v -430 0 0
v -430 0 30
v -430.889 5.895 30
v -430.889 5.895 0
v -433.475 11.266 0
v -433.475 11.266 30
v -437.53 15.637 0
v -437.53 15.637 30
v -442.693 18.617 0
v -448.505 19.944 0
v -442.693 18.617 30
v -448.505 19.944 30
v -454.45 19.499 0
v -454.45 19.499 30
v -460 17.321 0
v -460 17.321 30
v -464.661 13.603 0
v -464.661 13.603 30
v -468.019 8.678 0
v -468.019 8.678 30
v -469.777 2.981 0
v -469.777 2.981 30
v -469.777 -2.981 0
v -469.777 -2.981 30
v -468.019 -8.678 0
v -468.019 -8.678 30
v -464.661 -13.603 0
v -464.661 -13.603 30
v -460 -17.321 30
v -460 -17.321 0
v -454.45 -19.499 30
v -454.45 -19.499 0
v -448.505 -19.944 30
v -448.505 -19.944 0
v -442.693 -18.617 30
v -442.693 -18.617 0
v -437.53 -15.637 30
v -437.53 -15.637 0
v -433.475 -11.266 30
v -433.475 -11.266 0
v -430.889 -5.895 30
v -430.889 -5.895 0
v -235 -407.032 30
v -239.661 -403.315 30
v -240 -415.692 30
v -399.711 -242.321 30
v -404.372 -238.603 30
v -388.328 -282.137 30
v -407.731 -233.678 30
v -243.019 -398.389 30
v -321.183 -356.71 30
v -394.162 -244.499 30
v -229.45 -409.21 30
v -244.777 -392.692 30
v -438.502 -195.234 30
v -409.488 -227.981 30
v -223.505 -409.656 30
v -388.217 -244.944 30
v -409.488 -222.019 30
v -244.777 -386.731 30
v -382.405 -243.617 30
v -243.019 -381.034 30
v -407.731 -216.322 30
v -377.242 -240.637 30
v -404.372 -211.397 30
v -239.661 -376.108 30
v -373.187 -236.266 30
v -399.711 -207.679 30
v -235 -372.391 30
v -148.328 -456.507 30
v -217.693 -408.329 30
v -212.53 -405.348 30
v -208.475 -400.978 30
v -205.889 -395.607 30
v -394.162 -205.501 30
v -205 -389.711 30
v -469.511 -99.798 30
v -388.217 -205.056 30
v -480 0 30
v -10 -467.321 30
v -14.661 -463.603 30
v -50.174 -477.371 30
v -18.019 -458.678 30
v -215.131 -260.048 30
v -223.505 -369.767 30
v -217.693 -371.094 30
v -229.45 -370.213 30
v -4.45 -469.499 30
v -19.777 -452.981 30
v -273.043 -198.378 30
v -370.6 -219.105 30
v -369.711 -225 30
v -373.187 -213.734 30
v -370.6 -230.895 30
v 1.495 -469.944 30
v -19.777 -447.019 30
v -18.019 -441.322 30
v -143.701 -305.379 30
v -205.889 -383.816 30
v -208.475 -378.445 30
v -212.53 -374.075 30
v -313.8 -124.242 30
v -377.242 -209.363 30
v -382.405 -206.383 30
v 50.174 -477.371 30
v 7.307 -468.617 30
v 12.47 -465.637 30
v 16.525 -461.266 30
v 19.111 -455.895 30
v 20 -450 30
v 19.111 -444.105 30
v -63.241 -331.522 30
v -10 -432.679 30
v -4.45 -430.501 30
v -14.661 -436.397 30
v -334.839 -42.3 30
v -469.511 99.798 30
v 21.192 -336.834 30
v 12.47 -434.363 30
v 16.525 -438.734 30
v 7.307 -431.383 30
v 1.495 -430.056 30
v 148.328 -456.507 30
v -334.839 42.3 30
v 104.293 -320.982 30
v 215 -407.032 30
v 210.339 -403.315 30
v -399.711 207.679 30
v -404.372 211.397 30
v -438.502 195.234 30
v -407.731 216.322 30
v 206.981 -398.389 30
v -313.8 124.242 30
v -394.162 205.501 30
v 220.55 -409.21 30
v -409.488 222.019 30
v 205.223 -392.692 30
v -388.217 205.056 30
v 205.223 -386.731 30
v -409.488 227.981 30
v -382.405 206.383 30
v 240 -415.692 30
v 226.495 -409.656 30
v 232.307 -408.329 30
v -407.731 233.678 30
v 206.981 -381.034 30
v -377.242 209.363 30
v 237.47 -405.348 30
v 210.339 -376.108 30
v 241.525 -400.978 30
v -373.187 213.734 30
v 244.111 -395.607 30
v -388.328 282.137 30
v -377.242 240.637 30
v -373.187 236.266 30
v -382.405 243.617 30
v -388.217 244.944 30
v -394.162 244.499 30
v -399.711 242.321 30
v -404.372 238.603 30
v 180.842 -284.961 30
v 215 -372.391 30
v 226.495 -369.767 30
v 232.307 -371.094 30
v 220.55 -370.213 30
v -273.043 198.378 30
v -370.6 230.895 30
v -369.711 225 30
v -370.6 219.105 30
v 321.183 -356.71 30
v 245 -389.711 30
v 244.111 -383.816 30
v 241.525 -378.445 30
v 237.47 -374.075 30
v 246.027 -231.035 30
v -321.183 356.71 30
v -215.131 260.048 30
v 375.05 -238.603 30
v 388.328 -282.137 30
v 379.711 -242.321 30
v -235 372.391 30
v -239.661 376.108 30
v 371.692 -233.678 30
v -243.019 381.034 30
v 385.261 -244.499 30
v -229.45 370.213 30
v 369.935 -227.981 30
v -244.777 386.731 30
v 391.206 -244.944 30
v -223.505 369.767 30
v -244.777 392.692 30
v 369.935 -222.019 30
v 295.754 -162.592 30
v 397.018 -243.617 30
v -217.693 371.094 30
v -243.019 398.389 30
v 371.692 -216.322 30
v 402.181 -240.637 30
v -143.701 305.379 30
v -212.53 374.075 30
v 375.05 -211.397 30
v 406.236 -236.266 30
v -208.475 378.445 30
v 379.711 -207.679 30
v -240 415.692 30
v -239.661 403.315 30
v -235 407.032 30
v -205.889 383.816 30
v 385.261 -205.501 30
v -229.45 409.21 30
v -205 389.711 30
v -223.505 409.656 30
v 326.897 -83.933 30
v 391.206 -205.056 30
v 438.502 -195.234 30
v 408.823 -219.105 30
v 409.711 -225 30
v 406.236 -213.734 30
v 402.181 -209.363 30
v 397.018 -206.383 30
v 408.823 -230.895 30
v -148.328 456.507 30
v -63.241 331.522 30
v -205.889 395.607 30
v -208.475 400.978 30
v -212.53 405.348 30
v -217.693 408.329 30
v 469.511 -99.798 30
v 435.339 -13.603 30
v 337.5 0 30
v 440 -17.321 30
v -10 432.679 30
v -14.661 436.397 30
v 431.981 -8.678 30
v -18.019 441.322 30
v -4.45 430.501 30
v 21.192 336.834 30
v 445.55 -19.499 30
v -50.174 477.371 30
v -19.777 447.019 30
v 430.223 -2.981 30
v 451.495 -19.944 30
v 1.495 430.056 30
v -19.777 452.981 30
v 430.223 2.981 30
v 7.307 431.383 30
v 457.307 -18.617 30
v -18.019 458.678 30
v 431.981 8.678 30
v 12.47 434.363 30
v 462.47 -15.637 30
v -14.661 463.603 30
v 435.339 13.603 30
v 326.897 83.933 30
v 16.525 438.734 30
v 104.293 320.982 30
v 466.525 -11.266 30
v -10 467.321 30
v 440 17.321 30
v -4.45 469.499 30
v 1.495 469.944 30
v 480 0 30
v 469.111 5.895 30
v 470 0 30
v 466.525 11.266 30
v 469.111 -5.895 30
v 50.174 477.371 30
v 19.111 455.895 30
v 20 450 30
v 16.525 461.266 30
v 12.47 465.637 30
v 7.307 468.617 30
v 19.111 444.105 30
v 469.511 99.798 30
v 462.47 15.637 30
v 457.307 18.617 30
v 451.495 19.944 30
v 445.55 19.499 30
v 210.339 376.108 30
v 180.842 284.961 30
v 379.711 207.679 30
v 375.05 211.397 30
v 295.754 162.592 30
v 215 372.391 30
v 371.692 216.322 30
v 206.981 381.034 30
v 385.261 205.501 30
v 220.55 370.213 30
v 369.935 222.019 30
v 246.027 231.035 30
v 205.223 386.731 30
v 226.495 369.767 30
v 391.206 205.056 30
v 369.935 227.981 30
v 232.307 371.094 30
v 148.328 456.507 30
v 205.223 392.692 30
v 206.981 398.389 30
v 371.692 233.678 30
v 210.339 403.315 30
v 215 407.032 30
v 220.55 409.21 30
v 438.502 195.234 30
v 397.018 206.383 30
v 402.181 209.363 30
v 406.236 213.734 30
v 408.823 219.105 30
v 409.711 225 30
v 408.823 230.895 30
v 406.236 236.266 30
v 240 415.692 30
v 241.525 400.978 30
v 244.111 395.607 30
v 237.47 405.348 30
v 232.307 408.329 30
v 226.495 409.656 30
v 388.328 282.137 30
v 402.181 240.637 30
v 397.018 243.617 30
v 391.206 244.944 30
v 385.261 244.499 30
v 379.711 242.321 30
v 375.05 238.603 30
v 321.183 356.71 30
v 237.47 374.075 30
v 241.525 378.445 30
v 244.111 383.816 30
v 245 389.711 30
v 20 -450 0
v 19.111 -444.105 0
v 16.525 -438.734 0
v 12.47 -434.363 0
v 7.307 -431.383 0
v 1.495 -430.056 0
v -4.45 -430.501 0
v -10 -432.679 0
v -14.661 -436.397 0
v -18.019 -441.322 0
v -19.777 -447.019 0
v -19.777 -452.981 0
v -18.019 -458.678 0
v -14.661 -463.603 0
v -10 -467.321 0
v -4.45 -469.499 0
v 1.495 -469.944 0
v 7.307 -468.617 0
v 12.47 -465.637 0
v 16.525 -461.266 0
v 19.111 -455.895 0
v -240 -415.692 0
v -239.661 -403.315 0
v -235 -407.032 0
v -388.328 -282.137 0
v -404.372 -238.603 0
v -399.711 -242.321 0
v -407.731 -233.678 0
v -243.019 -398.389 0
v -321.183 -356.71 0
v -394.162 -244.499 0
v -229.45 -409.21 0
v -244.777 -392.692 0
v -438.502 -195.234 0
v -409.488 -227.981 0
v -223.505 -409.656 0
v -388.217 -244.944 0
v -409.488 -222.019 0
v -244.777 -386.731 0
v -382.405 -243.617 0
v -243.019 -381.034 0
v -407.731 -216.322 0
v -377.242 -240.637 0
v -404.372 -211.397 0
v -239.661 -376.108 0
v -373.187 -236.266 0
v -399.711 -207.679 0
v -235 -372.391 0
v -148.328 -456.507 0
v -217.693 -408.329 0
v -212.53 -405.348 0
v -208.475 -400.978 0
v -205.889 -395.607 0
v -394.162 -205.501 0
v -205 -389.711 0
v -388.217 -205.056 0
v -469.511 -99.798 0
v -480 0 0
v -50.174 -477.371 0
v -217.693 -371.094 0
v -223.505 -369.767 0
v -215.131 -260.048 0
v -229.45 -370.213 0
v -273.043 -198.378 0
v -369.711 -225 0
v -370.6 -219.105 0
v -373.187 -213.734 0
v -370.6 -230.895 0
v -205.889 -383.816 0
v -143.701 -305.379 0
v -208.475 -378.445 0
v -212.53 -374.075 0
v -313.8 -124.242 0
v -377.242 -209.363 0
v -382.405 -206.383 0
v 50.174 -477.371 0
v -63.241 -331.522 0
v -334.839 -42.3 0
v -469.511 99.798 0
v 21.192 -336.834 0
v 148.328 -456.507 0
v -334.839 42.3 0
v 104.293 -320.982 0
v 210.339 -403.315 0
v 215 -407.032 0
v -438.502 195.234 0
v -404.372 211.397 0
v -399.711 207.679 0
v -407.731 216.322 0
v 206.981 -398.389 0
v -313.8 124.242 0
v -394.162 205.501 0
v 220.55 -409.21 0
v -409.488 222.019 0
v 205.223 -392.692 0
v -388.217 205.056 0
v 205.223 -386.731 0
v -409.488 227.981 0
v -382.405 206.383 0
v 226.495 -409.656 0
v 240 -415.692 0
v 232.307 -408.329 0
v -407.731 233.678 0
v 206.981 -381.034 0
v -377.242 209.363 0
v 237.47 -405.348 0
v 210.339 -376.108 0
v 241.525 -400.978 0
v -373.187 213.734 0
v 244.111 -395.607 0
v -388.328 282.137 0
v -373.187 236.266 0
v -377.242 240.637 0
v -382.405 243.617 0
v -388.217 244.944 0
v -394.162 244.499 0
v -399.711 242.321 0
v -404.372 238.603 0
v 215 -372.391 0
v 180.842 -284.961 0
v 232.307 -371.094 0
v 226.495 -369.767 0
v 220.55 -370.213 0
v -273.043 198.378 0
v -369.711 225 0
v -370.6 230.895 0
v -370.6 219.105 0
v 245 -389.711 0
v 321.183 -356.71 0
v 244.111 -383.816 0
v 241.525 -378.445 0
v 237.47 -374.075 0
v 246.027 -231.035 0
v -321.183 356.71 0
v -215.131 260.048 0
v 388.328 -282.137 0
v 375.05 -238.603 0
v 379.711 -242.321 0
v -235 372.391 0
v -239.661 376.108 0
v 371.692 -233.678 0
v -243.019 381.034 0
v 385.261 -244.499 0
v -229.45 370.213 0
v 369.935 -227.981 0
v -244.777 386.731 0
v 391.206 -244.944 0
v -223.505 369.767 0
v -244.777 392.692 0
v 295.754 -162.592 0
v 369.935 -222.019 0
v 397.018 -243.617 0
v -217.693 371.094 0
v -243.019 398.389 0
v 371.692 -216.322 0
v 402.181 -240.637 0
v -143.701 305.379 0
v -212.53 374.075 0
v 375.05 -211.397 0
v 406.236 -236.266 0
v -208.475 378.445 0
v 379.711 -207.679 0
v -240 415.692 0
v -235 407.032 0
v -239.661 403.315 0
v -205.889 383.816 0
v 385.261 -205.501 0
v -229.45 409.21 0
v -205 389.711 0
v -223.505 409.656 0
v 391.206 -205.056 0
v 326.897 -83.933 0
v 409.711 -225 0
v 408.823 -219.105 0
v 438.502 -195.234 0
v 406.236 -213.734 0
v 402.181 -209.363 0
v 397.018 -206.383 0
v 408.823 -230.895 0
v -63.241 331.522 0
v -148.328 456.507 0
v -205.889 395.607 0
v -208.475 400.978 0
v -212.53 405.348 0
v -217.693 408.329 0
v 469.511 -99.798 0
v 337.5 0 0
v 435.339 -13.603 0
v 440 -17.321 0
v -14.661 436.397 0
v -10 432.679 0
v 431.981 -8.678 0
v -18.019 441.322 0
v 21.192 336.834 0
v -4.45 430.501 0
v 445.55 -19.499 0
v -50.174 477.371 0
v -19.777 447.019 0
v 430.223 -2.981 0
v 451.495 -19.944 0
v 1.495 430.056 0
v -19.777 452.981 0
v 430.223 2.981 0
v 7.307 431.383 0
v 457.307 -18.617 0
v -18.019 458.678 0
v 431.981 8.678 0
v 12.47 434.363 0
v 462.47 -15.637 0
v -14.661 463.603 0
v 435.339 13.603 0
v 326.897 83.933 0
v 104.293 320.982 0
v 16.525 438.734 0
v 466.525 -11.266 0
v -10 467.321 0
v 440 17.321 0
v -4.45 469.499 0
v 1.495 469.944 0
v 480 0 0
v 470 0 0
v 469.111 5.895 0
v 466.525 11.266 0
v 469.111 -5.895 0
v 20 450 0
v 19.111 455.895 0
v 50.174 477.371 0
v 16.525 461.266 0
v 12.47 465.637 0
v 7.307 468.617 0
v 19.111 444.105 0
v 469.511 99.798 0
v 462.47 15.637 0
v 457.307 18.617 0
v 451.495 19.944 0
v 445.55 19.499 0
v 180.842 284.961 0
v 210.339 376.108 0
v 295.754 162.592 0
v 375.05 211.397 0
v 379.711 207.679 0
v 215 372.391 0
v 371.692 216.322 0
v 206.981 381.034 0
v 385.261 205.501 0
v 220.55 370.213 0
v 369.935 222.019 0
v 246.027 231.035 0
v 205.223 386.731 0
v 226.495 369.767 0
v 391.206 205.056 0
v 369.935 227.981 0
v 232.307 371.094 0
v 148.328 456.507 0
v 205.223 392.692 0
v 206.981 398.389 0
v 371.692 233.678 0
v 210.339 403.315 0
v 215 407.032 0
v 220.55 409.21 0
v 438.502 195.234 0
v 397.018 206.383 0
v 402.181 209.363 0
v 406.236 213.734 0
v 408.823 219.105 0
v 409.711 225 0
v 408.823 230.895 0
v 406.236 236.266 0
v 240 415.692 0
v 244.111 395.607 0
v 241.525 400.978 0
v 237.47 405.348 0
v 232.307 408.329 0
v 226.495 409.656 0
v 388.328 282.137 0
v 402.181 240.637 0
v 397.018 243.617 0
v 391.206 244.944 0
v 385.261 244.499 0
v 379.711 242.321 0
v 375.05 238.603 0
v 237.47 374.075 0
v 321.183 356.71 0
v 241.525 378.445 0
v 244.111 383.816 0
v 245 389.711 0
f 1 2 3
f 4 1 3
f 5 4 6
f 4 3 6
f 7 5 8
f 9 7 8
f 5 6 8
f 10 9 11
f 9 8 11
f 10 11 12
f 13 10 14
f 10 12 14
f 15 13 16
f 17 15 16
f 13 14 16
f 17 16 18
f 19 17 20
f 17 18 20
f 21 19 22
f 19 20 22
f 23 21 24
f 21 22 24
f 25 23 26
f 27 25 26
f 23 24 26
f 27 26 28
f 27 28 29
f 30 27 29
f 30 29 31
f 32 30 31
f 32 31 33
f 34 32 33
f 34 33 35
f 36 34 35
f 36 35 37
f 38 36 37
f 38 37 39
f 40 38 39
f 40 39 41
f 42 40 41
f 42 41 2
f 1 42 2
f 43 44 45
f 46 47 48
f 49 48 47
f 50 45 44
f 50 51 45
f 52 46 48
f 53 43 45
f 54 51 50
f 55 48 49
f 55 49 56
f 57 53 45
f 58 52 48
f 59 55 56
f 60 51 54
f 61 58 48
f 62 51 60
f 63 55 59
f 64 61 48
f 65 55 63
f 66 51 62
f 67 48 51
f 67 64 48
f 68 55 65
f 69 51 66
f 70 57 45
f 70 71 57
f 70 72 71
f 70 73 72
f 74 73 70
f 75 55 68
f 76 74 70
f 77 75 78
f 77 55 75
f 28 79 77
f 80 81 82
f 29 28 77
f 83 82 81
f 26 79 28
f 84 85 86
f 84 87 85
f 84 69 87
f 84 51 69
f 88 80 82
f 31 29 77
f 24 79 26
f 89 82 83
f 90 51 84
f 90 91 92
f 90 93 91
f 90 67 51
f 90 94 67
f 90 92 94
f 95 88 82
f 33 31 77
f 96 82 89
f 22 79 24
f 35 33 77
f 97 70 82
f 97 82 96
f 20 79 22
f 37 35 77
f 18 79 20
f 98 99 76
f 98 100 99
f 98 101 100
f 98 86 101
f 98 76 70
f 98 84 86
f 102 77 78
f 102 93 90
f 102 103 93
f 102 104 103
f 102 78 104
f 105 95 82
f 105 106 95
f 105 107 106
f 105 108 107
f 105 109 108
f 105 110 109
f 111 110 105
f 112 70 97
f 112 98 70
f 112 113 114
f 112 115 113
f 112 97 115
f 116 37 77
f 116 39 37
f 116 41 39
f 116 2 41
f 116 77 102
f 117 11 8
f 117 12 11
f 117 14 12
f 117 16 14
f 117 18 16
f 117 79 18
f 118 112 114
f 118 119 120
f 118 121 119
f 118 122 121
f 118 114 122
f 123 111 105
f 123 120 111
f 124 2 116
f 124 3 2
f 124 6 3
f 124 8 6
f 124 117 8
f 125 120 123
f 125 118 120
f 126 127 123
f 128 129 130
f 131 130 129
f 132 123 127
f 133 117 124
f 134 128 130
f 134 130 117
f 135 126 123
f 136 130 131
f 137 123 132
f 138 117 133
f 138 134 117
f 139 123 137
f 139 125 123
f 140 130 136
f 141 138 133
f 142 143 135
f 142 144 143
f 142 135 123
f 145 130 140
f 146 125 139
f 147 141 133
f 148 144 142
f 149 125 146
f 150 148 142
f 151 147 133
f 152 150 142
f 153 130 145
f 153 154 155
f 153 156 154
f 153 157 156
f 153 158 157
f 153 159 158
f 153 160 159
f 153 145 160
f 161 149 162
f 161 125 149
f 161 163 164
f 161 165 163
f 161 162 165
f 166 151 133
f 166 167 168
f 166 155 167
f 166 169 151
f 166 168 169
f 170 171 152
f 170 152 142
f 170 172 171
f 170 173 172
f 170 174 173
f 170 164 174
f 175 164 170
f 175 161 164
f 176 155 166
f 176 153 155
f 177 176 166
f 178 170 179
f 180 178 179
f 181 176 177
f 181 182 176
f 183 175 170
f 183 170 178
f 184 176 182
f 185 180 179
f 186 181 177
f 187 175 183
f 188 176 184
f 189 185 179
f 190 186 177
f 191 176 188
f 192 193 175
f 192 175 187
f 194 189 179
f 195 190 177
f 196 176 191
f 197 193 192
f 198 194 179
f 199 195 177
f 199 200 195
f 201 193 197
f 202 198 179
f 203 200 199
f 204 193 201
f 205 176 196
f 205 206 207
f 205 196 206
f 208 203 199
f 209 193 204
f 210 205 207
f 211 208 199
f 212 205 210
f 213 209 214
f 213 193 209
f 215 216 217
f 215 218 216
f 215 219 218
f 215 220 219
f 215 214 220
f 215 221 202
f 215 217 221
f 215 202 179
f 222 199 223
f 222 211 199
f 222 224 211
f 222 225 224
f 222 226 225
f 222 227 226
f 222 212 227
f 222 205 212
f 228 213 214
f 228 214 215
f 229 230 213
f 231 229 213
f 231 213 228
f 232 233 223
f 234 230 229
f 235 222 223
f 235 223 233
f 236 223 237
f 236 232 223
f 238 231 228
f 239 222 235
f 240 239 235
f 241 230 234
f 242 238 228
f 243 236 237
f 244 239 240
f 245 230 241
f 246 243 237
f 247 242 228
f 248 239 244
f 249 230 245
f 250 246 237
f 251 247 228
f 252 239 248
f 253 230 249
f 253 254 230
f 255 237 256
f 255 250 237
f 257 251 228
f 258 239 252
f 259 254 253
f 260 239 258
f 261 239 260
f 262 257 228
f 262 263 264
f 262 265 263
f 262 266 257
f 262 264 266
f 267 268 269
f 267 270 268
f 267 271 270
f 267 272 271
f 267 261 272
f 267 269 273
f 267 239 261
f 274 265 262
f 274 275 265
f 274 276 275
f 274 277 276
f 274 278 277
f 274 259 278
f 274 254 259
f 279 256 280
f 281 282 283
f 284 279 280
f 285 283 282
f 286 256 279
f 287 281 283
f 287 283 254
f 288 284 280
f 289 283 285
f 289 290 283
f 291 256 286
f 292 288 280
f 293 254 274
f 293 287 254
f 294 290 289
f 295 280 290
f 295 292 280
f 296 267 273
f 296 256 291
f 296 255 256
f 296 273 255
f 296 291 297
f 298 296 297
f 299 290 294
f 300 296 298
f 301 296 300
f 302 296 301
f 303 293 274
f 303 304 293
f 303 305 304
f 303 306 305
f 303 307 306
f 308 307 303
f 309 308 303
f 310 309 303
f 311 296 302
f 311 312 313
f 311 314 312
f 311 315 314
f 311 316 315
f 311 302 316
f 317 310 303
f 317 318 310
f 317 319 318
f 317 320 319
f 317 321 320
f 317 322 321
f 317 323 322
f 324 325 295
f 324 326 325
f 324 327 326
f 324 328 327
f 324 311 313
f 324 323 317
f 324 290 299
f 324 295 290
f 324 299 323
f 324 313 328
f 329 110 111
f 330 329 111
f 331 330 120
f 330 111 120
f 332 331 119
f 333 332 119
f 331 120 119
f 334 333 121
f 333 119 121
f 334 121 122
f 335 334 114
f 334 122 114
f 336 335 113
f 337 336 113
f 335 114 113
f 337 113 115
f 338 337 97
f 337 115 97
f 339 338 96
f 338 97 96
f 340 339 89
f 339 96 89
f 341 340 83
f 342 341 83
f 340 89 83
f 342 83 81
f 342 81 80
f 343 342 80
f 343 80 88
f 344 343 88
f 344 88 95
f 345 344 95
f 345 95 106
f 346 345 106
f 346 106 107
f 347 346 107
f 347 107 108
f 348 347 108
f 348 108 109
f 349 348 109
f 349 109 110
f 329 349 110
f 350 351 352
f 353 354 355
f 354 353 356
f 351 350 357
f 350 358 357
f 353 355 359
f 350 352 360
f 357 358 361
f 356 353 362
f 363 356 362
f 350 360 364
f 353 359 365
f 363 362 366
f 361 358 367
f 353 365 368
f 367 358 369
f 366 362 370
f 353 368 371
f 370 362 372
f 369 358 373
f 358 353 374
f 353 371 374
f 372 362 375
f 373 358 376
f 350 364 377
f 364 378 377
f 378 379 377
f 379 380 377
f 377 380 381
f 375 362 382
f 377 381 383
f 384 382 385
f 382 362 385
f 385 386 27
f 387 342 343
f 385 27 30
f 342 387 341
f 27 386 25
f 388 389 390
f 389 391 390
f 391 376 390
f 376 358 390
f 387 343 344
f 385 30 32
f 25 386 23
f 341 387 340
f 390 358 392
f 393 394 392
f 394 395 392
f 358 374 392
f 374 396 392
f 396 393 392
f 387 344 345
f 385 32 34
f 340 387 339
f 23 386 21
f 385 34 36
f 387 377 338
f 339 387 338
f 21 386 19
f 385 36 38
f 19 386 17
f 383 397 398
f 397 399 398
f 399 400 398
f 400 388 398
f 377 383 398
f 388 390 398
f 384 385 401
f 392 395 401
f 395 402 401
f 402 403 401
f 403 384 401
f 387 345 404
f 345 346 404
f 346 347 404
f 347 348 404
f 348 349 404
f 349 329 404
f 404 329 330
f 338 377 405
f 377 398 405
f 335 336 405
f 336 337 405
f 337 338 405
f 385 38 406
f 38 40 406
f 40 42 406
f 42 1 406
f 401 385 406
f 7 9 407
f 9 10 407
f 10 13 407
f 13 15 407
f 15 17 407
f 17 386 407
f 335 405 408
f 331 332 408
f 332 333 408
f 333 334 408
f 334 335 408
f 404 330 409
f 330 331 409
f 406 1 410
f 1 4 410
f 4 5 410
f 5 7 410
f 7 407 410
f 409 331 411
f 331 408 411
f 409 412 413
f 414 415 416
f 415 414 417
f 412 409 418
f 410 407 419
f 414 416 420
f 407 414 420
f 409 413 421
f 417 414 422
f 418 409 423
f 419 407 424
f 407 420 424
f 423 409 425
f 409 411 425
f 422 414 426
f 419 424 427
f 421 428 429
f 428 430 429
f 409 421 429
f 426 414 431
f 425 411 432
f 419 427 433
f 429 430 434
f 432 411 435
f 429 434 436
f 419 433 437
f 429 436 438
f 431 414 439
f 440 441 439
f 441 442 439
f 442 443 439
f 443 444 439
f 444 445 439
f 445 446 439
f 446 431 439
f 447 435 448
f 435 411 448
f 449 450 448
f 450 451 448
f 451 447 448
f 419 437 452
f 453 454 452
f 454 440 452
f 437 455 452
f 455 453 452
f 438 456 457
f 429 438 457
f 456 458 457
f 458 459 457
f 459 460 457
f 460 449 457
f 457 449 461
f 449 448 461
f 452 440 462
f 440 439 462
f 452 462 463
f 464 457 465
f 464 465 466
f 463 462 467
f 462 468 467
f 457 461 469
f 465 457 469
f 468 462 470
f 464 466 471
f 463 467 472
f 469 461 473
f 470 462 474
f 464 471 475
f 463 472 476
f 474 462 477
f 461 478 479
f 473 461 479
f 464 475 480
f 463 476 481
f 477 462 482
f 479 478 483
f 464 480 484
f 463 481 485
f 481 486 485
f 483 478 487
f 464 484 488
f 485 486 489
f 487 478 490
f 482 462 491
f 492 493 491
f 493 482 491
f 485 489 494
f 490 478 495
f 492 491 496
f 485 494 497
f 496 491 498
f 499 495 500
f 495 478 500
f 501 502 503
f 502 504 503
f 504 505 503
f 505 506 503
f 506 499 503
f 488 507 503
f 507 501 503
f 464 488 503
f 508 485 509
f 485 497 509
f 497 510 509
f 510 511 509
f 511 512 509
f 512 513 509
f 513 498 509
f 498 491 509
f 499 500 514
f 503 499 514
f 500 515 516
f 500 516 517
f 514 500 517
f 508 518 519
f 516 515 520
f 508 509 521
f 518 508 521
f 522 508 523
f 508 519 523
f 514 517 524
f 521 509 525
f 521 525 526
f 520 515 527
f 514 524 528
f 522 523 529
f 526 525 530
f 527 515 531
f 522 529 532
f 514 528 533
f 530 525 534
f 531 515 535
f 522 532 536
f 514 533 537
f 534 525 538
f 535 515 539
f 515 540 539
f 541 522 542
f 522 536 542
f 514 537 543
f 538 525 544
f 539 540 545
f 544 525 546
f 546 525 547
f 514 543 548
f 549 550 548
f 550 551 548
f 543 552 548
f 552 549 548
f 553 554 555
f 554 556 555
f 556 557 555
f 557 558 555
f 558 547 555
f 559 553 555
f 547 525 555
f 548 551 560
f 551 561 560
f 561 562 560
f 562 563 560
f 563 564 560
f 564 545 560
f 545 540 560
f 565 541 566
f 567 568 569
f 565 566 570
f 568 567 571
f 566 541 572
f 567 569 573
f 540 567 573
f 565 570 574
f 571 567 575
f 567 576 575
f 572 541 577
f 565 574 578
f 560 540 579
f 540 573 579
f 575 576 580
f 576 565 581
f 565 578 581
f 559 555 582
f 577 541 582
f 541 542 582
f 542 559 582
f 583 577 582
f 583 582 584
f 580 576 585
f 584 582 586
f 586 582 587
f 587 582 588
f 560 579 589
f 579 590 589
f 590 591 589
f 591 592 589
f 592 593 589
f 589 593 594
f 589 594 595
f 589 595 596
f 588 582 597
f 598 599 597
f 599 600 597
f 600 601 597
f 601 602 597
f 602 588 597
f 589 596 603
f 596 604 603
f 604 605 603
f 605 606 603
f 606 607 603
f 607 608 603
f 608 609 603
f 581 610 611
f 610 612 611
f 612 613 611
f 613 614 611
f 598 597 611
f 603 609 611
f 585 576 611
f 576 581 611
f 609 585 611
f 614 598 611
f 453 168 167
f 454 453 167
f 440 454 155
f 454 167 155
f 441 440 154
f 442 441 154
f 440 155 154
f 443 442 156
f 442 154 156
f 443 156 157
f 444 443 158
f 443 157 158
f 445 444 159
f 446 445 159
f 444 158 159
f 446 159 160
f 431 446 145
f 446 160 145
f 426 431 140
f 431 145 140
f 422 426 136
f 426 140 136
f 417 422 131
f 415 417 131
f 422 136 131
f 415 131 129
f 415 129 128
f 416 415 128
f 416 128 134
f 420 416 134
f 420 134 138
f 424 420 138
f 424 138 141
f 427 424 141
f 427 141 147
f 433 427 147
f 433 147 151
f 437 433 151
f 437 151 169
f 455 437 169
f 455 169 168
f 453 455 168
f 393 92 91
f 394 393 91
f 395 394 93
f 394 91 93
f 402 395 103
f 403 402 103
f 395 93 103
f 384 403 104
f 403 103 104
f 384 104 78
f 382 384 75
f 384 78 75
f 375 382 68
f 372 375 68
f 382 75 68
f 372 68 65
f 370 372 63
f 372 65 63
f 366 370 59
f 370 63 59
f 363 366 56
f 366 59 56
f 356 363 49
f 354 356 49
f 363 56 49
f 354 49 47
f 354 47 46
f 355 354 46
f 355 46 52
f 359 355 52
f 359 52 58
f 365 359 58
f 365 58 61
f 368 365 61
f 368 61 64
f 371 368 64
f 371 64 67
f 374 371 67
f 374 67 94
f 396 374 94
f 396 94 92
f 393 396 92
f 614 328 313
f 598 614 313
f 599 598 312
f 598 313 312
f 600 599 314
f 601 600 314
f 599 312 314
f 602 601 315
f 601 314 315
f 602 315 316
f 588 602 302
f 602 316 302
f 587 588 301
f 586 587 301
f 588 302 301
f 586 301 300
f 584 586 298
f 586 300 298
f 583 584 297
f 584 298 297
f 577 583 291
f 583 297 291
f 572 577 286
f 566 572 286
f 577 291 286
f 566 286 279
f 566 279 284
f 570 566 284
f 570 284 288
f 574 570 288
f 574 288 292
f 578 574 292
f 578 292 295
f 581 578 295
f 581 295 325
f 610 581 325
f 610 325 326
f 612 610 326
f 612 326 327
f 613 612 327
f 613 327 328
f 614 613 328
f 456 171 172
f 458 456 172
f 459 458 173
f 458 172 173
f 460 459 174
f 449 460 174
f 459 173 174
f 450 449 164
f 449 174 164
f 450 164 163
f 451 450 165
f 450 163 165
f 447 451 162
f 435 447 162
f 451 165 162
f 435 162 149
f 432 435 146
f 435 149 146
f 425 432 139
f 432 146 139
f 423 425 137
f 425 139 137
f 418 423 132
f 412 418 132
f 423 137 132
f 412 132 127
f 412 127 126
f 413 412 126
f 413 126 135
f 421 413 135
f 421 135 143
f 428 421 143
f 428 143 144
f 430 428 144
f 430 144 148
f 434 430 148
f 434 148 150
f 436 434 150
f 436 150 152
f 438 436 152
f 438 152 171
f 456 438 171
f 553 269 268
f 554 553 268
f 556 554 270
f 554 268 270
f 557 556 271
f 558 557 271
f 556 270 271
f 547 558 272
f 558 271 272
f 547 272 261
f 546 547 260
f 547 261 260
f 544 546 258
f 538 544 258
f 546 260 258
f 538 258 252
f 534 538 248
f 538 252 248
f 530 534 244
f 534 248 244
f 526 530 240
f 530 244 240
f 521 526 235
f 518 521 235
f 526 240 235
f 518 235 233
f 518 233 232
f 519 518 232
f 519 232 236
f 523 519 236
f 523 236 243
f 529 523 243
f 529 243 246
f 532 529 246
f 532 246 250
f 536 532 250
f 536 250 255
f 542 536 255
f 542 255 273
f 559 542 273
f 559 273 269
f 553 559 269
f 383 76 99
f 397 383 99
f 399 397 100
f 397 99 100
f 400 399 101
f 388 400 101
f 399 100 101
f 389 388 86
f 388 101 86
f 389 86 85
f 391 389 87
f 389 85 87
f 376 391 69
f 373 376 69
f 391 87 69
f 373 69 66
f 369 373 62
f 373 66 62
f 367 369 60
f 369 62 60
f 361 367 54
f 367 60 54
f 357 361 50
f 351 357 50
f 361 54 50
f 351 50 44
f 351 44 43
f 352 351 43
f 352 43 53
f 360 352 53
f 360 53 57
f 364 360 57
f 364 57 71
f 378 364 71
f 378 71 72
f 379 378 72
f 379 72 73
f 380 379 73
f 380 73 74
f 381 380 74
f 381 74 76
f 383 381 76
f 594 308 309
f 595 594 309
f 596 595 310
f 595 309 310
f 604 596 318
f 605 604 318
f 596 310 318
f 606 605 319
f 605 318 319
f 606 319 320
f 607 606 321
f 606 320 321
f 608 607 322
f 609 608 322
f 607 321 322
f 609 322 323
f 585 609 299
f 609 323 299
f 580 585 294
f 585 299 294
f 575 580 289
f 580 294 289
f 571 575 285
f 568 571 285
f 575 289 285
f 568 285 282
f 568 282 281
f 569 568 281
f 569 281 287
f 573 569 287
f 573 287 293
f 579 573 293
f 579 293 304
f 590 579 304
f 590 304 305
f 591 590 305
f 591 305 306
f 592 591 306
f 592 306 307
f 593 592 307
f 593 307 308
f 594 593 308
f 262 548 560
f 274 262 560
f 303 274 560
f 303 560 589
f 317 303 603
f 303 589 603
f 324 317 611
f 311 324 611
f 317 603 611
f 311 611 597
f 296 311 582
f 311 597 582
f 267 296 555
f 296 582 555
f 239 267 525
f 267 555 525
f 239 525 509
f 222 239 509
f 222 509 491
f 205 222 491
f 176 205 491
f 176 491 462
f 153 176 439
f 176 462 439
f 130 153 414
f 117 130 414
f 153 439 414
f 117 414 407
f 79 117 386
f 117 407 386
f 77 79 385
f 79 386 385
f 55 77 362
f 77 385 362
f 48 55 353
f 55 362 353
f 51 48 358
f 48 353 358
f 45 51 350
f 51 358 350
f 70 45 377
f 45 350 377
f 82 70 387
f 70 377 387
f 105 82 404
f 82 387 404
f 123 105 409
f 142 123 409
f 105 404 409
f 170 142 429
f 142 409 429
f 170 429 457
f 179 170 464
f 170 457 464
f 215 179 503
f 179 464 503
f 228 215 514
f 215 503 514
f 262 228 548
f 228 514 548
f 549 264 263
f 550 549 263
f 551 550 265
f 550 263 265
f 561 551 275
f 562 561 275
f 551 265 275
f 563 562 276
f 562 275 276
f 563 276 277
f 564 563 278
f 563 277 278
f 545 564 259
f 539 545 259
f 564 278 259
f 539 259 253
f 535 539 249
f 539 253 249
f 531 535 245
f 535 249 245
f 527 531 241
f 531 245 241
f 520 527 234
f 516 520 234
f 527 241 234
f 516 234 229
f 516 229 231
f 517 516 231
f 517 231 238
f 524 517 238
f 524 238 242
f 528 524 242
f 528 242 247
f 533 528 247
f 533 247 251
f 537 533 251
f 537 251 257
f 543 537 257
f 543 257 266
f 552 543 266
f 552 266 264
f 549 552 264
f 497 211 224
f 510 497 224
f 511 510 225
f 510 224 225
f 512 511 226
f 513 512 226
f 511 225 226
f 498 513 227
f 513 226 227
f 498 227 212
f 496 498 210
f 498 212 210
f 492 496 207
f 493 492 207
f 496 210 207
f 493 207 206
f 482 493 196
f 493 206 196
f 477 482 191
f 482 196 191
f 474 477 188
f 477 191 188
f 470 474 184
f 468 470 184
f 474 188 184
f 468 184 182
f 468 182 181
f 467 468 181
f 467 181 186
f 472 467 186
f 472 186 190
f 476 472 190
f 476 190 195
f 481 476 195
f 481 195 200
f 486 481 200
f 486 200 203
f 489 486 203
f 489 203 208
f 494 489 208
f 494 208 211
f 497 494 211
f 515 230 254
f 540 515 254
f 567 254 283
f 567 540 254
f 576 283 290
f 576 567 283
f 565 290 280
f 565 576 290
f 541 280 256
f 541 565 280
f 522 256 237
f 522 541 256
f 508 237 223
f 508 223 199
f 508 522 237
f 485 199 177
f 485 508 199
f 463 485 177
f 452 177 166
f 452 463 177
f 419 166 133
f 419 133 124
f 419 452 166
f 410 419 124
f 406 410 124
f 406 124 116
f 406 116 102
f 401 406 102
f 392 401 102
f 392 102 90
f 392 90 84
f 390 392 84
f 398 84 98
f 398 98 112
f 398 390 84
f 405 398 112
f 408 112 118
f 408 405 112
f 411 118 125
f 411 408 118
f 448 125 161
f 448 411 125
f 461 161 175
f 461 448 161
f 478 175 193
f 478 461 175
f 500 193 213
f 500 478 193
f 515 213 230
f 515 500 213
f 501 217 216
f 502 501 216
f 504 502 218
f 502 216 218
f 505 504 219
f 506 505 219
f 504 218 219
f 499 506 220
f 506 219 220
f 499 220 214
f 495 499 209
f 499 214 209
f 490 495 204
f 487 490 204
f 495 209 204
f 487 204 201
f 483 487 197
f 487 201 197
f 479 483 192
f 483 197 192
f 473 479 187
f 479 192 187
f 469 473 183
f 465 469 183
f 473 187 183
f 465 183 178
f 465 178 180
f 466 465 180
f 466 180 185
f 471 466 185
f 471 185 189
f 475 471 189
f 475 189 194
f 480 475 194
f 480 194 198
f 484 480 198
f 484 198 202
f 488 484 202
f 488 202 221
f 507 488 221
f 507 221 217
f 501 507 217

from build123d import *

# Parameters (mm, degrees)
F0_R     = 480
F0_R_2   = 337.5
F1_DEPTH = 30
F2_R     = 20
F3_DEPTH = 30.001


with BuildPart() as f1:
    # F0 (on Top) → F1 (new body)
    with BuildSketch(Plane.XY):
        Circle(F0_R)
        Circle(F0_R_2, mode=Mode.SUBTRACT)
    extrude(amount=F1_DEPTH)

    # F2 (on face) → F3 (cut, through all)
    with BuildSketch(Plane.XY.offset(30)):
        with Locations((-389.711432, 225)):
            Circle(F2_R)
        with Locations((-450, 0)):
            Circle(F2_R)
        with Locations((-389.711432, -225)):
            Circle(F2_R)
        with Locations((-225, -389.711432)):
            Circle(F2_R)
        with Locations((0, -450)):
            Circle(F2_R)
        with Locations((225, -389.711432)):
            Circle(F2_R)
        with Locations((389.711432, -225)):
            Circle(F2_R)
        with Locations((450, 0)):
            Circle(F2_R)
        with Locations((389.711432, 225)):
            Circle(F2_R)
        with Locations((225, 389.711432)):
            Circle(F2_R)
        with Locations((0, 450)):
            Circle(F2_R)
        with Locations((-225, 389.711432)):
            Circle(F2_R)
    extrude(amount=-F3_DEPTH, mode=Mode.SUBTRACT)


solid = f1.part
